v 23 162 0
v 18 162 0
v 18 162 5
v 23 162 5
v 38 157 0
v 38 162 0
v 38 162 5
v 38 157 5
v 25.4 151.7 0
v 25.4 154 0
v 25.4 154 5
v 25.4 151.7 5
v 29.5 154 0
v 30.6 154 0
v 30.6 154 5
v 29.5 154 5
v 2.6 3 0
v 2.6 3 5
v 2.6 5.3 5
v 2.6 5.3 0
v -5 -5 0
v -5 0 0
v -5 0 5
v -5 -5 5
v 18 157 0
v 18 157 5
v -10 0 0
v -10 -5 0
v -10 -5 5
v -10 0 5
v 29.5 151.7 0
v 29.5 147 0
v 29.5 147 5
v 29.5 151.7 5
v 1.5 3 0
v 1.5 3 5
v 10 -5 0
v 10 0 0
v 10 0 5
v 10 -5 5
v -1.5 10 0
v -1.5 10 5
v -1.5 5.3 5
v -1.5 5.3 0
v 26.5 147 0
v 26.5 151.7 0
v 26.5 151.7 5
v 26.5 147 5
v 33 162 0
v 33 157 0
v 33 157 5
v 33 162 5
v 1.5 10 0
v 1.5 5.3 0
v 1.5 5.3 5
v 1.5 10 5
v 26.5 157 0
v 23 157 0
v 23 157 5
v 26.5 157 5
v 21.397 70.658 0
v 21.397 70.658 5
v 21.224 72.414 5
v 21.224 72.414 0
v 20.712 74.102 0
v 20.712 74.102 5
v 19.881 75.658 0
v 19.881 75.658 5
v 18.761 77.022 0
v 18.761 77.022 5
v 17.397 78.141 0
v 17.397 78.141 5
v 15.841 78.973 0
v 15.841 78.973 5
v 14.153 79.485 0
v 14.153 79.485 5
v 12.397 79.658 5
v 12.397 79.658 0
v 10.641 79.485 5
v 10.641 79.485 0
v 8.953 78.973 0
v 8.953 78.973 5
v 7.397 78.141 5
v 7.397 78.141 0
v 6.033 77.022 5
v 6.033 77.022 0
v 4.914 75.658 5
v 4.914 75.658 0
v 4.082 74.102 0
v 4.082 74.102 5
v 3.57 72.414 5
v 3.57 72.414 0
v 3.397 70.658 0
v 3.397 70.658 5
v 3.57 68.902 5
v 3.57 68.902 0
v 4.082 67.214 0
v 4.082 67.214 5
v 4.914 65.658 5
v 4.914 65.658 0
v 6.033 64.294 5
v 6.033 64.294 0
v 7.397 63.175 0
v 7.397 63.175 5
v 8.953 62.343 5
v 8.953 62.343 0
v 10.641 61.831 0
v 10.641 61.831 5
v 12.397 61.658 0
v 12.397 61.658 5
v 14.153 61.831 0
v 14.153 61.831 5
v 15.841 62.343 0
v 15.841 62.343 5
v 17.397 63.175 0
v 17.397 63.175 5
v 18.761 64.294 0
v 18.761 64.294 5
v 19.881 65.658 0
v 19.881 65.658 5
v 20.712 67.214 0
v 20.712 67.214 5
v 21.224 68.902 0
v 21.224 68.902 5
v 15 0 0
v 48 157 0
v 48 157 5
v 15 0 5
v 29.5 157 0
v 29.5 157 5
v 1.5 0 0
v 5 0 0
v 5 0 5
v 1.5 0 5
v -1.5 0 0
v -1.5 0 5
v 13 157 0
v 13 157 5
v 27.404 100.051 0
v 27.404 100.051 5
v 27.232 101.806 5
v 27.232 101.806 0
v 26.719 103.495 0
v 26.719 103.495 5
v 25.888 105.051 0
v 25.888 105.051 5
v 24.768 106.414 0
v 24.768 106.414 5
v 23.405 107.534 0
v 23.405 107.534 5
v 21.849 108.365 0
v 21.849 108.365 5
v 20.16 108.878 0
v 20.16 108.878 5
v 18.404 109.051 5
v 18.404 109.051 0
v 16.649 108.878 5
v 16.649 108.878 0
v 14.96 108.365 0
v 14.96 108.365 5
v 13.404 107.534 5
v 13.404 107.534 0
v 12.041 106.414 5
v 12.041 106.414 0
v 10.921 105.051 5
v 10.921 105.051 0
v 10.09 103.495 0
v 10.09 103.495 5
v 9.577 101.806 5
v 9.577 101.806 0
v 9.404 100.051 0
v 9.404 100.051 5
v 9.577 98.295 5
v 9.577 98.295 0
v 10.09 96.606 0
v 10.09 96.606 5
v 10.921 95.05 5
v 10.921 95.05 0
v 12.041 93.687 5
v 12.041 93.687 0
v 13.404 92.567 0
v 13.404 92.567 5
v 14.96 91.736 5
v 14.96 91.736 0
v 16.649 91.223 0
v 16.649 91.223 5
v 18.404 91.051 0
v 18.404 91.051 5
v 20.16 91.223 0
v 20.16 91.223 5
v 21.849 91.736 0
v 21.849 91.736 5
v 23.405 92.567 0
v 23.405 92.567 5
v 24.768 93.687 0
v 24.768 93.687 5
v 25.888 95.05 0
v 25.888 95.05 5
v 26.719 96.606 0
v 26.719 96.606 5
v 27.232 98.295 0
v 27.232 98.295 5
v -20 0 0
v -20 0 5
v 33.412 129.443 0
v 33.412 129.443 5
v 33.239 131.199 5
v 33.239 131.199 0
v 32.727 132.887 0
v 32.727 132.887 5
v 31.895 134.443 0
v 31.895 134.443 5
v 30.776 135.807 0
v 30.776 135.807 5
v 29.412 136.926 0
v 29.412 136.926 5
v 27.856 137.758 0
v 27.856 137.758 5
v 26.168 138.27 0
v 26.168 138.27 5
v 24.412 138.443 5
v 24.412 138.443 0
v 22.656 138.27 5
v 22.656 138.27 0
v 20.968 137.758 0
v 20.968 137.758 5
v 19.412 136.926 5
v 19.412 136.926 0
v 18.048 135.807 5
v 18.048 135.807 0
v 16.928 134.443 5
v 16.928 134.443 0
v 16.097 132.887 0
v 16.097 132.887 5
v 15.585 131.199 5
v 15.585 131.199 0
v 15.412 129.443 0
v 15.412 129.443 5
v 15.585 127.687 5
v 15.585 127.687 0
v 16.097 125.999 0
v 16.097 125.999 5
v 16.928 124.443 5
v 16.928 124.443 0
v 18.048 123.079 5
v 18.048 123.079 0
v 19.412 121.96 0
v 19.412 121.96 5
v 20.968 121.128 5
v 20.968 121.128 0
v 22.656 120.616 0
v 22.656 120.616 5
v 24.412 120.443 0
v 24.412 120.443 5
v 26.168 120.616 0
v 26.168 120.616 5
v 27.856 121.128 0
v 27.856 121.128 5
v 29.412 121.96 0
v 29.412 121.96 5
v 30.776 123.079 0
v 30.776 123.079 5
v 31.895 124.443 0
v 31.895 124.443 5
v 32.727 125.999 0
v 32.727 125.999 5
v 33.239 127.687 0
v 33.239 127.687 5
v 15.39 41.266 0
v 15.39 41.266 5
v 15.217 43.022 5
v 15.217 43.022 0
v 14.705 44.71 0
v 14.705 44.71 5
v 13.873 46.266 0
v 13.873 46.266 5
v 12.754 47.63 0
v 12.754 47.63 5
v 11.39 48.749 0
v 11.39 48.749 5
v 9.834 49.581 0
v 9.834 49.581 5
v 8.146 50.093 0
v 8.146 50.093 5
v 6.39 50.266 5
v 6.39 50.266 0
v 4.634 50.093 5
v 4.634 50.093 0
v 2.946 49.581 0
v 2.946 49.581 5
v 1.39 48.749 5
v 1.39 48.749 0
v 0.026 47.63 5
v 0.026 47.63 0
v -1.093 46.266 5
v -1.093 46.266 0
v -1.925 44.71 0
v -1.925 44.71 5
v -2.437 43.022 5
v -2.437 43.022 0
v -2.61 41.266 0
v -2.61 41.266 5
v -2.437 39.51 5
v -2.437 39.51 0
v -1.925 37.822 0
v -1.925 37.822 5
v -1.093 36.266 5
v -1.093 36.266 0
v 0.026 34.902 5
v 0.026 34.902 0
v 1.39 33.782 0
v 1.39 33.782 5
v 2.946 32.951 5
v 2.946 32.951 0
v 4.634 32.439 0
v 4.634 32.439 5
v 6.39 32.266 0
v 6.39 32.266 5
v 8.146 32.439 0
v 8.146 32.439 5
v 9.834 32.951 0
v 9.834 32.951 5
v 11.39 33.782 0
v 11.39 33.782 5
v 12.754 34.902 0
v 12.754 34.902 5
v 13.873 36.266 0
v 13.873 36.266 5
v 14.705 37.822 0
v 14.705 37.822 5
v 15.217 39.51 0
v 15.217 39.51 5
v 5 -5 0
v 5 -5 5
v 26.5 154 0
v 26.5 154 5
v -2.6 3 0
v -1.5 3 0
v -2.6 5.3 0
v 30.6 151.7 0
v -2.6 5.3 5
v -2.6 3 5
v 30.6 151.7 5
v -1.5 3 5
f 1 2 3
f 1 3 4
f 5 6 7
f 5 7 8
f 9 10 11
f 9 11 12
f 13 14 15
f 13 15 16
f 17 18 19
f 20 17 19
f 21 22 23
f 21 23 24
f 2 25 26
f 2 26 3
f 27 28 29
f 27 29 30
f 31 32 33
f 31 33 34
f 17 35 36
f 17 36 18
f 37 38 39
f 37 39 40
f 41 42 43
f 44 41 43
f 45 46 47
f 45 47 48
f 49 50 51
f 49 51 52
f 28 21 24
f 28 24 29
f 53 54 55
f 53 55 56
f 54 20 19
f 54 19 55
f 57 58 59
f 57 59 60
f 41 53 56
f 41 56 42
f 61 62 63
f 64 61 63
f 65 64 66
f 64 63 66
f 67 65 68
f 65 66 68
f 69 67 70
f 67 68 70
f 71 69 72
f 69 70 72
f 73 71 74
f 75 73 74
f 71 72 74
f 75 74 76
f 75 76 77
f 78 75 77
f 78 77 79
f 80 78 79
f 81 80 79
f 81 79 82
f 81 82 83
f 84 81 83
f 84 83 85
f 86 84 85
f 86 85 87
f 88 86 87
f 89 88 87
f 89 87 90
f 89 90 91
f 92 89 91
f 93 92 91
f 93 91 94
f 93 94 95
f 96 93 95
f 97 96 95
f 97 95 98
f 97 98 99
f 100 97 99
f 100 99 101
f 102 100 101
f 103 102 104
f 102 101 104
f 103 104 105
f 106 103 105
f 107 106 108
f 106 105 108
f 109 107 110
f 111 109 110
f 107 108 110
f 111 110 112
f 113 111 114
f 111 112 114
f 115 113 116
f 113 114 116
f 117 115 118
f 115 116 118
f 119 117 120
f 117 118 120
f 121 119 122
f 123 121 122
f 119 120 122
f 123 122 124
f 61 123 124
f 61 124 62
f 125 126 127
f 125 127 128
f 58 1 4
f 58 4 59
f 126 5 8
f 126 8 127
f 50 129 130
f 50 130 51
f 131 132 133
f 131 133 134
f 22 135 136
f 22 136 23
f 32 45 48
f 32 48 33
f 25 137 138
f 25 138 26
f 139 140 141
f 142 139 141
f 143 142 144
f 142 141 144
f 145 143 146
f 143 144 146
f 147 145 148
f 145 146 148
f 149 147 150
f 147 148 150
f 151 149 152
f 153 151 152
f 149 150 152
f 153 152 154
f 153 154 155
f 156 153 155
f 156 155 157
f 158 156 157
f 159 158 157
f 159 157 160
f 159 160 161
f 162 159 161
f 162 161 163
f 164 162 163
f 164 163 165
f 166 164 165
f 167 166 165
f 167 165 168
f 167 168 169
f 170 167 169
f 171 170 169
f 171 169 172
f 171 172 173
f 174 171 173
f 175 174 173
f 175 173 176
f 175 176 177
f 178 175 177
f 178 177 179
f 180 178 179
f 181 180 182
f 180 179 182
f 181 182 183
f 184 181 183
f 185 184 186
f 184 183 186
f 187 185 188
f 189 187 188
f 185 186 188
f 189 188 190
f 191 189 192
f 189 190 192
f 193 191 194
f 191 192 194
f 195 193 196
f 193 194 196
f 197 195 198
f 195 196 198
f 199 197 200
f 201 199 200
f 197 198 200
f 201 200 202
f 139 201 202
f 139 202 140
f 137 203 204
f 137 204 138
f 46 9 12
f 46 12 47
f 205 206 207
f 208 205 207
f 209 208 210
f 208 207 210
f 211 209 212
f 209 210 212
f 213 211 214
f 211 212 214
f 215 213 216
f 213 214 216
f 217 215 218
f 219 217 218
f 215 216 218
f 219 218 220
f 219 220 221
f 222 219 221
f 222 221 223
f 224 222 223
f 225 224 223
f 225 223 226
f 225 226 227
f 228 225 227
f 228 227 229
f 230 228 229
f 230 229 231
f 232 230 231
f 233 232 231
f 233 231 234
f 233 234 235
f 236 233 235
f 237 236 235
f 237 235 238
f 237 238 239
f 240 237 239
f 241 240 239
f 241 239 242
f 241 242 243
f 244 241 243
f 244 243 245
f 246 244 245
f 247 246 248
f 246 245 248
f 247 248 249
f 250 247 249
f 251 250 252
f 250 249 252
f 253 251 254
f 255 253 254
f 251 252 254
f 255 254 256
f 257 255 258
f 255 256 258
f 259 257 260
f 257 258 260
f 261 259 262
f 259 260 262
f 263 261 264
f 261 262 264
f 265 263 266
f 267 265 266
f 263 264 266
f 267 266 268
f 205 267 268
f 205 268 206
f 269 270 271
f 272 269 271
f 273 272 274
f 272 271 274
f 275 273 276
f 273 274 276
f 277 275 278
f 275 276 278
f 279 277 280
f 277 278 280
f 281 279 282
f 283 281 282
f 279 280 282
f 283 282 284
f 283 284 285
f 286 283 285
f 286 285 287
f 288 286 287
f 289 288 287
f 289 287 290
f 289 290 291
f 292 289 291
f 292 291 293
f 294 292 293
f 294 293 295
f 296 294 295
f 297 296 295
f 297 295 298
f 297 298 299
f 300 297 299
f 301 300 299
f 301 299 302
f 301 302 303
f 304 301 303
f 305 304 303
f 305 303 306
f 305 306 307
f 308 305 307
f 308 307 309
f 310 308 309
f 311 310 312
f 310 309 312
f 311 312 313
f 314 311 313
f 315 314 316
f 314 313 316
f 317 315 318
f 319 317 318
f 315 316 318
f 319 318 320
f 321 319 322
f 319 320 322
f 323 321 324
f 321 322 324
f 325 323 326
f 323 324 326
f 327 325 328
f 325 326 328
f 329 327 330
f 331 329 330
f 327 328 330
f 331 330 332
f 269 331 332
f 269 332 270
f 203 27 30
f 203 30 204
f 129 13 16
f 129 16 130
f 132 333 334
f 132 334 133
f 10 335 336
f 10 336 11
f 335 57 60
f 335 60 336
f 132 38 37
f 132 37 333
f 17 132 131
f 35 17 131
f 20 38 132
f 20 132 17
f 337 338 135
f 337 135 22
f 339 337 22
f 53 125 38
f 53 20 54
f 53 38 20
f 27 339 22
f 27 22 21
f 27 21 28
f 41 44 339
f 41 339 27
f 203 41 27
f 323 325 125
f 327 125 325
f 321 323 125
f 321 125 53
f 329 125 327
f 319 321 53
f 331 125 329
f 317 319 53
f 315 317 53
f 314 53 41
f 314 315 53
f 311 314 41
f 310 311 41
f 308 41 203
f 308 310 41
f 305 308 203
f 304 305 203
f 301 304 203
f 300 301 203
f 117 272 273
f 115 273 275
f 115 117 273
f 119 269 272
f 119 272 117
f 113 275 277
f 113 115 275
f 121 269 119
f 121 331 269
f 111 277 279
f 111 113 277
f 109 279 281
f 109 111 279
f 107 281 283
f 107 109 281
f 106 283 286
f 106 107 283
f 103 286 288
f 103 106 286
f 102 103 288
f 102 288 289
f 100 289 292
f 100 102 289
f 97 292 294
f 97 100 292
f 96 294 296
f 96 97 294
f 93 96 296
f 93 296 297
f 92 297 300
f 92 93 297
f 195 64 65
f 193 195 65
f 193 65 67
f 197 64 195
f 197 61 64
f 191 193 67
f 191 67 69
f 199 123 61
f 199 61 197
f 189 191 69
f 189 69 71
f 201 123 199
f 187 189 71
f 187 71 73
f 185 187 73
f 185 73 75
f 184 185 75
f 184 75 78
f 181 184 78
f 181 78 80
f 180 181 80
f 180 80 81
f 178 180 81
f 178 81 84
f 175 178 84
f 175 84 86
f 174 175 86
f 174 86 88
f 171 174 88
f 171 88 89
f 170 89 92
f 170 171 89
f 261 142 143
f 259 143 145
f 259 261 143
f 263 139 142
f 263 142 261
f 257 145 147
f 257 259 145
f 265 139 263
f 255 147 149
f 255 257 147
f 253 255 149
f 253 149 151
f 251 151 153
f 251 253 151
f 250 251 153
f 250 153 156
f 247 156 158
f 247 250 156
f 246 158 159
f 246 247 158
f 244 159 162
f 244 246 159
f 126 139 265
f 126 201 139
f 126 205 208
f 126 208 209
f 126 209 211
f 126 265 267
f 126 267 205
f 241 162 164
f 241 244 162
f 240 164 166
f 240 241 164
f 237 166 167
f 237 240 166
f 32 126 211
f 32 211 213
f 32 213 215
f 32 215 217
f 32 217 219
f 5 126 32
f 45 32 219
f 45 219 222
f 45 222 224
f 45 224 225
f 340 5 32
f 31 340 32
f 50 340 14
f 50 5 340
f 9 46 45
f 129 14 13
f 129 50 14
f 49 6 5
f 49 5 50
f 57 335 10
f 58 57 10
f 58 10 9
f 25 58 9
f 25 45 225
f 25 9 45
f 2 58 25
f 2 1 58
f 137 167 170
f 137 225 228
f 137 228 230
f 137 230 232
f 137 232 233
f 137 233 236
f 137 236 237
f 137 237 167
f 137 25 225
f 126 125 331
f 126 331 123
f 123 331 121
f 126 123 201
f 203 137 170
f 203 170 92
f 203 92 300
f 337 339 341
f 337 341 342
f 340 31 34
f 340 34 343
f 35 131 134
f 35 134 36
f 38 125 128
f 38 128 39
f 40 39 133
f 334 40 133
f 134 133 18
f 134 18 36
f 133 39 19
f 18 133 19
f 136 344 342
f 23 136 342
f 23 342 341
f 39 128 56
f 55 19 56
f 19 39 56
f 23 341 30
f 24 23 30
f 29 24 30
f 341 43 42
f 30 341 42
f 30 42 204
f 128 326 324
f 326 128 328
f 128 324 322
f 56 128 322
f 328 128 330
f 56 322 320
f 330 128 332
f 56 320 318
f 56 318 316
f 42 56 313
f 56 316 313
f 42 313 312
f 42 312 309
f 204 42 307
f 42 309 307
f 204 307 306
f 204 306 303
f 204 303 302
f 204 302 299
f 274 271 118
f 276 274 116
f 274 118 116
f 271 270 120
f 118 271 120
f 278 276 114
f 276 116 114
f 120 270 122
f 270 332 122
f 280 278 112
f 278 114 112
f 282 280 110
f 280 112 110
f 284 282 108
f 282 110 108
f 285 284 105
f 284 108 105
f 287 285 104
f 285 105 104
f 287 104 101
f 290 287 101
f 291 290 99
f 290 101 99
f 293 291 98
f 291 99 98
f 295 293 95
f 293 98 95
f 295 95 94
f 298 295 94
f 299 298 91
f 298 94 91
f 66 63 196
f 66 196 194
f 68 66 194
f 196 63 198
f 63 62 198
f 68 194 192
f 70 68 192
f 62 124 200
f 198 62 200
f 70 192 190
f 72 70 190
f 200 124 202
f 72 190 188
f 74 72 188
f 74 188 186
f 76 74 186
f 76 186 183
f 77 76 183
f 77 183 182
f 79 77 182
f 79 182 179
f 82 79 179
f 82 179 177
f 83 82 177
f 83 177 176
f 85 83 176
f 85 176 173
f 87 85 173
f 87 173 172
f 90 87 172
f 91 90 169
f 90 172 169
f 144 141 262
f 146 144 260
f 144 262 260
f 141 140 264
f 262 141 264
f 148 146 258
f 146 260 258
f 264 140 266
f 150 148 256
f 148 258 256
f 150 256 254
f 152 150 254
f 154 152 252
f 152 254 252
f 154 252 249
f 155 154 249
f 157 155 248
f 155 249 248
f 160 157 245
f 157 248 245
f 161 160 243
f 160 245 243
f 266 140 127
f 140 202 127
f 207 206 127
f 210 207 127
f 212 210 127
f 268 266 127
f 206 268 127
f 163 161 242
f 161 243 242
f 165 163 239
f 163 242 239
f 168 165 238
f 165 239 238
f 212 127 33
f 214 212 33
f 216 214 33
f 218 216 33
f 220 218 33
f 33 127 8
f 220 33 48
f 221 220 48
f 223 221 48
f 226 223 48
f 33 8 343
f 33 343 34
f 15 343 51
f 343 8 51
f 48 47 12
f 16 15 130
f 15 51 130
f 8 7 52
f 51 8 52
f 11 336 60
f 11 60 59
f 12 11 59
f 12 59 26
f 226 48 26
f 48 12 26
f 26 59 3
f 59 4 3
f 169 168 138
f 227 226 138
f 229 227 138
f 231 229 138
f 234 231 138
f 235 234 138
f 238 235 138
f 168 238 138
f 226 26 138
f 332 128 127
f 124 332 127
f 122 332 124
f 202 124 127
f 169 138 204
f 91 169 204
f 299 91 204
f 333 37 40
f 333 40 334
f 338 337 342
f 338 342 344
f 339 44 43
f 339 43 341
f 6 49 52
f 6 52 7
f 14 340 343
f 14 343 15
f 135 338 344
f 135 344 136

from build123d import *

# Parameters (mm, degrees)
BOSS_EXTRU_1_DEPTH      = 5
ESQUISSE2_R             = 9
ENL_V_MAT_EXTRU_1_DEPTH = 170.03549923


with BuildPart() as part:
    # Esquisse1 → Boss.-Extru.1 (new body)
    with BuildSketch(Plane.XY):
        Polygon((29.5, 154), (29.5, 157), (33, 157), (33, 162), (38, 162), (38, 157), (48, 157), (15, 0), (10, 0), (10, -5), (5, -5), (5, 0), (1.5, 0), (1.5, 3), (2.6, 3), (2.6, 5.3), (1.5, 5.3), (1.5, 10), (-1.5, 10), (-1.5, 5.3), (-2.6, 5.3), (-2.6, 3), (-1.5, 3), (-1.5, 0), (-5, 0), (-5, -5), (-10, -5), (-10, 0), (-20, 0), (13, 157), (18, 157), (18, 162), (23, 162), (23, 157), (26.5, 157), (26.5, 154), (25.4, 154), (25.4, 151.7), (26.5, 151.7), (26.5, 147), (29.5, 147), (29.5, 151.7), (30.6, 151.7), (30.6, 154), align=None)
    extrude(amount=BOSS_EXTRU_1_DEPTH)

    # Esquisse2 → Enlèv. mat.-Extru.1 (cut, through all)
    with BuildSketch(Plane.XY.offset(5)):
        with Locations((24.411695113, 129.442936805)):
            Circle(ESQUISSE2_R)
        with Locations((18.404488272, 100.050531902)):
            Circle(ESQUISSE2_R)
        with Locations((12.397281431, 70.658126999)):
            Circle(ESQUISSE2_R)
        with Locations((6.390074589, 41.265722097)):
            Circle(ESQUISSE2_R)
    extrude(amount=-ENL_V_MAT_EXTRU_1_DEPTH, mode=Mode.SUBTRACT)


solid = part.part
